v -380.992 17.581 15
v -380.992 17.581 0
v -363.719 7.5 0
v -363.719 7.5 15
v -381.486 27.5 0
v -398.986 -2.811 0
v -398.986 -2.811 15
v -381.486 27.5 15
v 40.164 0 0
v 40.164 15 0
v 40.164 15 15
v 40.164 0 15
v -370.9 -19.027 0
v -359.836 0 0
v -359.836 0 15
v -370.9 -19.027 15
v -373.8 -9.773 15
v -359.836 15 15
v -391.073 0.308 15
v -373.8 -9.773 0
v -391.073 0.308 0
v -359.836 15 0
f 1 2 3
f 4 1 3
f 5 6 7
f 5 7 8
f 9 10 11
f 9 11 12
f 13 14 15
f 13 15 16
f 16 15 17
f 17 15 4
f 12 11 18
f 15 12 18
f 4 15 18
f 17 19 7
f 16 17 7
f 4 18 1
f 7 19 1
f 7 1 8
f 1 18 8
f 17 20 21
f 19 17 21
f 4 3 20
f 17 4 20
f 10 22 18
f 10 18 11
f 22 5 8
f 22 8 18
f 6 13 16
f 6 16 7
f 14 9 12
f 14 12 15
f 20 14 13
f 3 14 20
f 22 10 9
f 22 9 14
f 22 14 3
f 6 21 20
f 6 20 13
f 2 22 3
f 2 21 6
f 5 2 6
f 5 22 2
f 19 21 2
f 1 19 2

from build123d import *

# Parameters (mm, degrees)
EXTRUDE_2_DEPTH = 15


with BuildPart() as part:
    # 草图2 → 凸台-拉伸2 (new body)
    with BuildSketch(Plane.XY):
        Polygon((-359.835728953, 15), (40.164271047, 15), (40.164271047, 0), (-359.835728953, 0), (-370.899758445, -19.026698438), (-398.986364047, -2.810889132), (-381.486364047, 27.5), align=None)
        Polygon((-373.799917415, -9.77331612), (-391.073233535, 0.307980932), (-380.991936484, 17.581297051), (-363.718620364, 7.5), align=None, mode=Mode.SUBTRACT)
    extrude(amount=EXTRUDE_2_DEPTH)


solid = part.part
